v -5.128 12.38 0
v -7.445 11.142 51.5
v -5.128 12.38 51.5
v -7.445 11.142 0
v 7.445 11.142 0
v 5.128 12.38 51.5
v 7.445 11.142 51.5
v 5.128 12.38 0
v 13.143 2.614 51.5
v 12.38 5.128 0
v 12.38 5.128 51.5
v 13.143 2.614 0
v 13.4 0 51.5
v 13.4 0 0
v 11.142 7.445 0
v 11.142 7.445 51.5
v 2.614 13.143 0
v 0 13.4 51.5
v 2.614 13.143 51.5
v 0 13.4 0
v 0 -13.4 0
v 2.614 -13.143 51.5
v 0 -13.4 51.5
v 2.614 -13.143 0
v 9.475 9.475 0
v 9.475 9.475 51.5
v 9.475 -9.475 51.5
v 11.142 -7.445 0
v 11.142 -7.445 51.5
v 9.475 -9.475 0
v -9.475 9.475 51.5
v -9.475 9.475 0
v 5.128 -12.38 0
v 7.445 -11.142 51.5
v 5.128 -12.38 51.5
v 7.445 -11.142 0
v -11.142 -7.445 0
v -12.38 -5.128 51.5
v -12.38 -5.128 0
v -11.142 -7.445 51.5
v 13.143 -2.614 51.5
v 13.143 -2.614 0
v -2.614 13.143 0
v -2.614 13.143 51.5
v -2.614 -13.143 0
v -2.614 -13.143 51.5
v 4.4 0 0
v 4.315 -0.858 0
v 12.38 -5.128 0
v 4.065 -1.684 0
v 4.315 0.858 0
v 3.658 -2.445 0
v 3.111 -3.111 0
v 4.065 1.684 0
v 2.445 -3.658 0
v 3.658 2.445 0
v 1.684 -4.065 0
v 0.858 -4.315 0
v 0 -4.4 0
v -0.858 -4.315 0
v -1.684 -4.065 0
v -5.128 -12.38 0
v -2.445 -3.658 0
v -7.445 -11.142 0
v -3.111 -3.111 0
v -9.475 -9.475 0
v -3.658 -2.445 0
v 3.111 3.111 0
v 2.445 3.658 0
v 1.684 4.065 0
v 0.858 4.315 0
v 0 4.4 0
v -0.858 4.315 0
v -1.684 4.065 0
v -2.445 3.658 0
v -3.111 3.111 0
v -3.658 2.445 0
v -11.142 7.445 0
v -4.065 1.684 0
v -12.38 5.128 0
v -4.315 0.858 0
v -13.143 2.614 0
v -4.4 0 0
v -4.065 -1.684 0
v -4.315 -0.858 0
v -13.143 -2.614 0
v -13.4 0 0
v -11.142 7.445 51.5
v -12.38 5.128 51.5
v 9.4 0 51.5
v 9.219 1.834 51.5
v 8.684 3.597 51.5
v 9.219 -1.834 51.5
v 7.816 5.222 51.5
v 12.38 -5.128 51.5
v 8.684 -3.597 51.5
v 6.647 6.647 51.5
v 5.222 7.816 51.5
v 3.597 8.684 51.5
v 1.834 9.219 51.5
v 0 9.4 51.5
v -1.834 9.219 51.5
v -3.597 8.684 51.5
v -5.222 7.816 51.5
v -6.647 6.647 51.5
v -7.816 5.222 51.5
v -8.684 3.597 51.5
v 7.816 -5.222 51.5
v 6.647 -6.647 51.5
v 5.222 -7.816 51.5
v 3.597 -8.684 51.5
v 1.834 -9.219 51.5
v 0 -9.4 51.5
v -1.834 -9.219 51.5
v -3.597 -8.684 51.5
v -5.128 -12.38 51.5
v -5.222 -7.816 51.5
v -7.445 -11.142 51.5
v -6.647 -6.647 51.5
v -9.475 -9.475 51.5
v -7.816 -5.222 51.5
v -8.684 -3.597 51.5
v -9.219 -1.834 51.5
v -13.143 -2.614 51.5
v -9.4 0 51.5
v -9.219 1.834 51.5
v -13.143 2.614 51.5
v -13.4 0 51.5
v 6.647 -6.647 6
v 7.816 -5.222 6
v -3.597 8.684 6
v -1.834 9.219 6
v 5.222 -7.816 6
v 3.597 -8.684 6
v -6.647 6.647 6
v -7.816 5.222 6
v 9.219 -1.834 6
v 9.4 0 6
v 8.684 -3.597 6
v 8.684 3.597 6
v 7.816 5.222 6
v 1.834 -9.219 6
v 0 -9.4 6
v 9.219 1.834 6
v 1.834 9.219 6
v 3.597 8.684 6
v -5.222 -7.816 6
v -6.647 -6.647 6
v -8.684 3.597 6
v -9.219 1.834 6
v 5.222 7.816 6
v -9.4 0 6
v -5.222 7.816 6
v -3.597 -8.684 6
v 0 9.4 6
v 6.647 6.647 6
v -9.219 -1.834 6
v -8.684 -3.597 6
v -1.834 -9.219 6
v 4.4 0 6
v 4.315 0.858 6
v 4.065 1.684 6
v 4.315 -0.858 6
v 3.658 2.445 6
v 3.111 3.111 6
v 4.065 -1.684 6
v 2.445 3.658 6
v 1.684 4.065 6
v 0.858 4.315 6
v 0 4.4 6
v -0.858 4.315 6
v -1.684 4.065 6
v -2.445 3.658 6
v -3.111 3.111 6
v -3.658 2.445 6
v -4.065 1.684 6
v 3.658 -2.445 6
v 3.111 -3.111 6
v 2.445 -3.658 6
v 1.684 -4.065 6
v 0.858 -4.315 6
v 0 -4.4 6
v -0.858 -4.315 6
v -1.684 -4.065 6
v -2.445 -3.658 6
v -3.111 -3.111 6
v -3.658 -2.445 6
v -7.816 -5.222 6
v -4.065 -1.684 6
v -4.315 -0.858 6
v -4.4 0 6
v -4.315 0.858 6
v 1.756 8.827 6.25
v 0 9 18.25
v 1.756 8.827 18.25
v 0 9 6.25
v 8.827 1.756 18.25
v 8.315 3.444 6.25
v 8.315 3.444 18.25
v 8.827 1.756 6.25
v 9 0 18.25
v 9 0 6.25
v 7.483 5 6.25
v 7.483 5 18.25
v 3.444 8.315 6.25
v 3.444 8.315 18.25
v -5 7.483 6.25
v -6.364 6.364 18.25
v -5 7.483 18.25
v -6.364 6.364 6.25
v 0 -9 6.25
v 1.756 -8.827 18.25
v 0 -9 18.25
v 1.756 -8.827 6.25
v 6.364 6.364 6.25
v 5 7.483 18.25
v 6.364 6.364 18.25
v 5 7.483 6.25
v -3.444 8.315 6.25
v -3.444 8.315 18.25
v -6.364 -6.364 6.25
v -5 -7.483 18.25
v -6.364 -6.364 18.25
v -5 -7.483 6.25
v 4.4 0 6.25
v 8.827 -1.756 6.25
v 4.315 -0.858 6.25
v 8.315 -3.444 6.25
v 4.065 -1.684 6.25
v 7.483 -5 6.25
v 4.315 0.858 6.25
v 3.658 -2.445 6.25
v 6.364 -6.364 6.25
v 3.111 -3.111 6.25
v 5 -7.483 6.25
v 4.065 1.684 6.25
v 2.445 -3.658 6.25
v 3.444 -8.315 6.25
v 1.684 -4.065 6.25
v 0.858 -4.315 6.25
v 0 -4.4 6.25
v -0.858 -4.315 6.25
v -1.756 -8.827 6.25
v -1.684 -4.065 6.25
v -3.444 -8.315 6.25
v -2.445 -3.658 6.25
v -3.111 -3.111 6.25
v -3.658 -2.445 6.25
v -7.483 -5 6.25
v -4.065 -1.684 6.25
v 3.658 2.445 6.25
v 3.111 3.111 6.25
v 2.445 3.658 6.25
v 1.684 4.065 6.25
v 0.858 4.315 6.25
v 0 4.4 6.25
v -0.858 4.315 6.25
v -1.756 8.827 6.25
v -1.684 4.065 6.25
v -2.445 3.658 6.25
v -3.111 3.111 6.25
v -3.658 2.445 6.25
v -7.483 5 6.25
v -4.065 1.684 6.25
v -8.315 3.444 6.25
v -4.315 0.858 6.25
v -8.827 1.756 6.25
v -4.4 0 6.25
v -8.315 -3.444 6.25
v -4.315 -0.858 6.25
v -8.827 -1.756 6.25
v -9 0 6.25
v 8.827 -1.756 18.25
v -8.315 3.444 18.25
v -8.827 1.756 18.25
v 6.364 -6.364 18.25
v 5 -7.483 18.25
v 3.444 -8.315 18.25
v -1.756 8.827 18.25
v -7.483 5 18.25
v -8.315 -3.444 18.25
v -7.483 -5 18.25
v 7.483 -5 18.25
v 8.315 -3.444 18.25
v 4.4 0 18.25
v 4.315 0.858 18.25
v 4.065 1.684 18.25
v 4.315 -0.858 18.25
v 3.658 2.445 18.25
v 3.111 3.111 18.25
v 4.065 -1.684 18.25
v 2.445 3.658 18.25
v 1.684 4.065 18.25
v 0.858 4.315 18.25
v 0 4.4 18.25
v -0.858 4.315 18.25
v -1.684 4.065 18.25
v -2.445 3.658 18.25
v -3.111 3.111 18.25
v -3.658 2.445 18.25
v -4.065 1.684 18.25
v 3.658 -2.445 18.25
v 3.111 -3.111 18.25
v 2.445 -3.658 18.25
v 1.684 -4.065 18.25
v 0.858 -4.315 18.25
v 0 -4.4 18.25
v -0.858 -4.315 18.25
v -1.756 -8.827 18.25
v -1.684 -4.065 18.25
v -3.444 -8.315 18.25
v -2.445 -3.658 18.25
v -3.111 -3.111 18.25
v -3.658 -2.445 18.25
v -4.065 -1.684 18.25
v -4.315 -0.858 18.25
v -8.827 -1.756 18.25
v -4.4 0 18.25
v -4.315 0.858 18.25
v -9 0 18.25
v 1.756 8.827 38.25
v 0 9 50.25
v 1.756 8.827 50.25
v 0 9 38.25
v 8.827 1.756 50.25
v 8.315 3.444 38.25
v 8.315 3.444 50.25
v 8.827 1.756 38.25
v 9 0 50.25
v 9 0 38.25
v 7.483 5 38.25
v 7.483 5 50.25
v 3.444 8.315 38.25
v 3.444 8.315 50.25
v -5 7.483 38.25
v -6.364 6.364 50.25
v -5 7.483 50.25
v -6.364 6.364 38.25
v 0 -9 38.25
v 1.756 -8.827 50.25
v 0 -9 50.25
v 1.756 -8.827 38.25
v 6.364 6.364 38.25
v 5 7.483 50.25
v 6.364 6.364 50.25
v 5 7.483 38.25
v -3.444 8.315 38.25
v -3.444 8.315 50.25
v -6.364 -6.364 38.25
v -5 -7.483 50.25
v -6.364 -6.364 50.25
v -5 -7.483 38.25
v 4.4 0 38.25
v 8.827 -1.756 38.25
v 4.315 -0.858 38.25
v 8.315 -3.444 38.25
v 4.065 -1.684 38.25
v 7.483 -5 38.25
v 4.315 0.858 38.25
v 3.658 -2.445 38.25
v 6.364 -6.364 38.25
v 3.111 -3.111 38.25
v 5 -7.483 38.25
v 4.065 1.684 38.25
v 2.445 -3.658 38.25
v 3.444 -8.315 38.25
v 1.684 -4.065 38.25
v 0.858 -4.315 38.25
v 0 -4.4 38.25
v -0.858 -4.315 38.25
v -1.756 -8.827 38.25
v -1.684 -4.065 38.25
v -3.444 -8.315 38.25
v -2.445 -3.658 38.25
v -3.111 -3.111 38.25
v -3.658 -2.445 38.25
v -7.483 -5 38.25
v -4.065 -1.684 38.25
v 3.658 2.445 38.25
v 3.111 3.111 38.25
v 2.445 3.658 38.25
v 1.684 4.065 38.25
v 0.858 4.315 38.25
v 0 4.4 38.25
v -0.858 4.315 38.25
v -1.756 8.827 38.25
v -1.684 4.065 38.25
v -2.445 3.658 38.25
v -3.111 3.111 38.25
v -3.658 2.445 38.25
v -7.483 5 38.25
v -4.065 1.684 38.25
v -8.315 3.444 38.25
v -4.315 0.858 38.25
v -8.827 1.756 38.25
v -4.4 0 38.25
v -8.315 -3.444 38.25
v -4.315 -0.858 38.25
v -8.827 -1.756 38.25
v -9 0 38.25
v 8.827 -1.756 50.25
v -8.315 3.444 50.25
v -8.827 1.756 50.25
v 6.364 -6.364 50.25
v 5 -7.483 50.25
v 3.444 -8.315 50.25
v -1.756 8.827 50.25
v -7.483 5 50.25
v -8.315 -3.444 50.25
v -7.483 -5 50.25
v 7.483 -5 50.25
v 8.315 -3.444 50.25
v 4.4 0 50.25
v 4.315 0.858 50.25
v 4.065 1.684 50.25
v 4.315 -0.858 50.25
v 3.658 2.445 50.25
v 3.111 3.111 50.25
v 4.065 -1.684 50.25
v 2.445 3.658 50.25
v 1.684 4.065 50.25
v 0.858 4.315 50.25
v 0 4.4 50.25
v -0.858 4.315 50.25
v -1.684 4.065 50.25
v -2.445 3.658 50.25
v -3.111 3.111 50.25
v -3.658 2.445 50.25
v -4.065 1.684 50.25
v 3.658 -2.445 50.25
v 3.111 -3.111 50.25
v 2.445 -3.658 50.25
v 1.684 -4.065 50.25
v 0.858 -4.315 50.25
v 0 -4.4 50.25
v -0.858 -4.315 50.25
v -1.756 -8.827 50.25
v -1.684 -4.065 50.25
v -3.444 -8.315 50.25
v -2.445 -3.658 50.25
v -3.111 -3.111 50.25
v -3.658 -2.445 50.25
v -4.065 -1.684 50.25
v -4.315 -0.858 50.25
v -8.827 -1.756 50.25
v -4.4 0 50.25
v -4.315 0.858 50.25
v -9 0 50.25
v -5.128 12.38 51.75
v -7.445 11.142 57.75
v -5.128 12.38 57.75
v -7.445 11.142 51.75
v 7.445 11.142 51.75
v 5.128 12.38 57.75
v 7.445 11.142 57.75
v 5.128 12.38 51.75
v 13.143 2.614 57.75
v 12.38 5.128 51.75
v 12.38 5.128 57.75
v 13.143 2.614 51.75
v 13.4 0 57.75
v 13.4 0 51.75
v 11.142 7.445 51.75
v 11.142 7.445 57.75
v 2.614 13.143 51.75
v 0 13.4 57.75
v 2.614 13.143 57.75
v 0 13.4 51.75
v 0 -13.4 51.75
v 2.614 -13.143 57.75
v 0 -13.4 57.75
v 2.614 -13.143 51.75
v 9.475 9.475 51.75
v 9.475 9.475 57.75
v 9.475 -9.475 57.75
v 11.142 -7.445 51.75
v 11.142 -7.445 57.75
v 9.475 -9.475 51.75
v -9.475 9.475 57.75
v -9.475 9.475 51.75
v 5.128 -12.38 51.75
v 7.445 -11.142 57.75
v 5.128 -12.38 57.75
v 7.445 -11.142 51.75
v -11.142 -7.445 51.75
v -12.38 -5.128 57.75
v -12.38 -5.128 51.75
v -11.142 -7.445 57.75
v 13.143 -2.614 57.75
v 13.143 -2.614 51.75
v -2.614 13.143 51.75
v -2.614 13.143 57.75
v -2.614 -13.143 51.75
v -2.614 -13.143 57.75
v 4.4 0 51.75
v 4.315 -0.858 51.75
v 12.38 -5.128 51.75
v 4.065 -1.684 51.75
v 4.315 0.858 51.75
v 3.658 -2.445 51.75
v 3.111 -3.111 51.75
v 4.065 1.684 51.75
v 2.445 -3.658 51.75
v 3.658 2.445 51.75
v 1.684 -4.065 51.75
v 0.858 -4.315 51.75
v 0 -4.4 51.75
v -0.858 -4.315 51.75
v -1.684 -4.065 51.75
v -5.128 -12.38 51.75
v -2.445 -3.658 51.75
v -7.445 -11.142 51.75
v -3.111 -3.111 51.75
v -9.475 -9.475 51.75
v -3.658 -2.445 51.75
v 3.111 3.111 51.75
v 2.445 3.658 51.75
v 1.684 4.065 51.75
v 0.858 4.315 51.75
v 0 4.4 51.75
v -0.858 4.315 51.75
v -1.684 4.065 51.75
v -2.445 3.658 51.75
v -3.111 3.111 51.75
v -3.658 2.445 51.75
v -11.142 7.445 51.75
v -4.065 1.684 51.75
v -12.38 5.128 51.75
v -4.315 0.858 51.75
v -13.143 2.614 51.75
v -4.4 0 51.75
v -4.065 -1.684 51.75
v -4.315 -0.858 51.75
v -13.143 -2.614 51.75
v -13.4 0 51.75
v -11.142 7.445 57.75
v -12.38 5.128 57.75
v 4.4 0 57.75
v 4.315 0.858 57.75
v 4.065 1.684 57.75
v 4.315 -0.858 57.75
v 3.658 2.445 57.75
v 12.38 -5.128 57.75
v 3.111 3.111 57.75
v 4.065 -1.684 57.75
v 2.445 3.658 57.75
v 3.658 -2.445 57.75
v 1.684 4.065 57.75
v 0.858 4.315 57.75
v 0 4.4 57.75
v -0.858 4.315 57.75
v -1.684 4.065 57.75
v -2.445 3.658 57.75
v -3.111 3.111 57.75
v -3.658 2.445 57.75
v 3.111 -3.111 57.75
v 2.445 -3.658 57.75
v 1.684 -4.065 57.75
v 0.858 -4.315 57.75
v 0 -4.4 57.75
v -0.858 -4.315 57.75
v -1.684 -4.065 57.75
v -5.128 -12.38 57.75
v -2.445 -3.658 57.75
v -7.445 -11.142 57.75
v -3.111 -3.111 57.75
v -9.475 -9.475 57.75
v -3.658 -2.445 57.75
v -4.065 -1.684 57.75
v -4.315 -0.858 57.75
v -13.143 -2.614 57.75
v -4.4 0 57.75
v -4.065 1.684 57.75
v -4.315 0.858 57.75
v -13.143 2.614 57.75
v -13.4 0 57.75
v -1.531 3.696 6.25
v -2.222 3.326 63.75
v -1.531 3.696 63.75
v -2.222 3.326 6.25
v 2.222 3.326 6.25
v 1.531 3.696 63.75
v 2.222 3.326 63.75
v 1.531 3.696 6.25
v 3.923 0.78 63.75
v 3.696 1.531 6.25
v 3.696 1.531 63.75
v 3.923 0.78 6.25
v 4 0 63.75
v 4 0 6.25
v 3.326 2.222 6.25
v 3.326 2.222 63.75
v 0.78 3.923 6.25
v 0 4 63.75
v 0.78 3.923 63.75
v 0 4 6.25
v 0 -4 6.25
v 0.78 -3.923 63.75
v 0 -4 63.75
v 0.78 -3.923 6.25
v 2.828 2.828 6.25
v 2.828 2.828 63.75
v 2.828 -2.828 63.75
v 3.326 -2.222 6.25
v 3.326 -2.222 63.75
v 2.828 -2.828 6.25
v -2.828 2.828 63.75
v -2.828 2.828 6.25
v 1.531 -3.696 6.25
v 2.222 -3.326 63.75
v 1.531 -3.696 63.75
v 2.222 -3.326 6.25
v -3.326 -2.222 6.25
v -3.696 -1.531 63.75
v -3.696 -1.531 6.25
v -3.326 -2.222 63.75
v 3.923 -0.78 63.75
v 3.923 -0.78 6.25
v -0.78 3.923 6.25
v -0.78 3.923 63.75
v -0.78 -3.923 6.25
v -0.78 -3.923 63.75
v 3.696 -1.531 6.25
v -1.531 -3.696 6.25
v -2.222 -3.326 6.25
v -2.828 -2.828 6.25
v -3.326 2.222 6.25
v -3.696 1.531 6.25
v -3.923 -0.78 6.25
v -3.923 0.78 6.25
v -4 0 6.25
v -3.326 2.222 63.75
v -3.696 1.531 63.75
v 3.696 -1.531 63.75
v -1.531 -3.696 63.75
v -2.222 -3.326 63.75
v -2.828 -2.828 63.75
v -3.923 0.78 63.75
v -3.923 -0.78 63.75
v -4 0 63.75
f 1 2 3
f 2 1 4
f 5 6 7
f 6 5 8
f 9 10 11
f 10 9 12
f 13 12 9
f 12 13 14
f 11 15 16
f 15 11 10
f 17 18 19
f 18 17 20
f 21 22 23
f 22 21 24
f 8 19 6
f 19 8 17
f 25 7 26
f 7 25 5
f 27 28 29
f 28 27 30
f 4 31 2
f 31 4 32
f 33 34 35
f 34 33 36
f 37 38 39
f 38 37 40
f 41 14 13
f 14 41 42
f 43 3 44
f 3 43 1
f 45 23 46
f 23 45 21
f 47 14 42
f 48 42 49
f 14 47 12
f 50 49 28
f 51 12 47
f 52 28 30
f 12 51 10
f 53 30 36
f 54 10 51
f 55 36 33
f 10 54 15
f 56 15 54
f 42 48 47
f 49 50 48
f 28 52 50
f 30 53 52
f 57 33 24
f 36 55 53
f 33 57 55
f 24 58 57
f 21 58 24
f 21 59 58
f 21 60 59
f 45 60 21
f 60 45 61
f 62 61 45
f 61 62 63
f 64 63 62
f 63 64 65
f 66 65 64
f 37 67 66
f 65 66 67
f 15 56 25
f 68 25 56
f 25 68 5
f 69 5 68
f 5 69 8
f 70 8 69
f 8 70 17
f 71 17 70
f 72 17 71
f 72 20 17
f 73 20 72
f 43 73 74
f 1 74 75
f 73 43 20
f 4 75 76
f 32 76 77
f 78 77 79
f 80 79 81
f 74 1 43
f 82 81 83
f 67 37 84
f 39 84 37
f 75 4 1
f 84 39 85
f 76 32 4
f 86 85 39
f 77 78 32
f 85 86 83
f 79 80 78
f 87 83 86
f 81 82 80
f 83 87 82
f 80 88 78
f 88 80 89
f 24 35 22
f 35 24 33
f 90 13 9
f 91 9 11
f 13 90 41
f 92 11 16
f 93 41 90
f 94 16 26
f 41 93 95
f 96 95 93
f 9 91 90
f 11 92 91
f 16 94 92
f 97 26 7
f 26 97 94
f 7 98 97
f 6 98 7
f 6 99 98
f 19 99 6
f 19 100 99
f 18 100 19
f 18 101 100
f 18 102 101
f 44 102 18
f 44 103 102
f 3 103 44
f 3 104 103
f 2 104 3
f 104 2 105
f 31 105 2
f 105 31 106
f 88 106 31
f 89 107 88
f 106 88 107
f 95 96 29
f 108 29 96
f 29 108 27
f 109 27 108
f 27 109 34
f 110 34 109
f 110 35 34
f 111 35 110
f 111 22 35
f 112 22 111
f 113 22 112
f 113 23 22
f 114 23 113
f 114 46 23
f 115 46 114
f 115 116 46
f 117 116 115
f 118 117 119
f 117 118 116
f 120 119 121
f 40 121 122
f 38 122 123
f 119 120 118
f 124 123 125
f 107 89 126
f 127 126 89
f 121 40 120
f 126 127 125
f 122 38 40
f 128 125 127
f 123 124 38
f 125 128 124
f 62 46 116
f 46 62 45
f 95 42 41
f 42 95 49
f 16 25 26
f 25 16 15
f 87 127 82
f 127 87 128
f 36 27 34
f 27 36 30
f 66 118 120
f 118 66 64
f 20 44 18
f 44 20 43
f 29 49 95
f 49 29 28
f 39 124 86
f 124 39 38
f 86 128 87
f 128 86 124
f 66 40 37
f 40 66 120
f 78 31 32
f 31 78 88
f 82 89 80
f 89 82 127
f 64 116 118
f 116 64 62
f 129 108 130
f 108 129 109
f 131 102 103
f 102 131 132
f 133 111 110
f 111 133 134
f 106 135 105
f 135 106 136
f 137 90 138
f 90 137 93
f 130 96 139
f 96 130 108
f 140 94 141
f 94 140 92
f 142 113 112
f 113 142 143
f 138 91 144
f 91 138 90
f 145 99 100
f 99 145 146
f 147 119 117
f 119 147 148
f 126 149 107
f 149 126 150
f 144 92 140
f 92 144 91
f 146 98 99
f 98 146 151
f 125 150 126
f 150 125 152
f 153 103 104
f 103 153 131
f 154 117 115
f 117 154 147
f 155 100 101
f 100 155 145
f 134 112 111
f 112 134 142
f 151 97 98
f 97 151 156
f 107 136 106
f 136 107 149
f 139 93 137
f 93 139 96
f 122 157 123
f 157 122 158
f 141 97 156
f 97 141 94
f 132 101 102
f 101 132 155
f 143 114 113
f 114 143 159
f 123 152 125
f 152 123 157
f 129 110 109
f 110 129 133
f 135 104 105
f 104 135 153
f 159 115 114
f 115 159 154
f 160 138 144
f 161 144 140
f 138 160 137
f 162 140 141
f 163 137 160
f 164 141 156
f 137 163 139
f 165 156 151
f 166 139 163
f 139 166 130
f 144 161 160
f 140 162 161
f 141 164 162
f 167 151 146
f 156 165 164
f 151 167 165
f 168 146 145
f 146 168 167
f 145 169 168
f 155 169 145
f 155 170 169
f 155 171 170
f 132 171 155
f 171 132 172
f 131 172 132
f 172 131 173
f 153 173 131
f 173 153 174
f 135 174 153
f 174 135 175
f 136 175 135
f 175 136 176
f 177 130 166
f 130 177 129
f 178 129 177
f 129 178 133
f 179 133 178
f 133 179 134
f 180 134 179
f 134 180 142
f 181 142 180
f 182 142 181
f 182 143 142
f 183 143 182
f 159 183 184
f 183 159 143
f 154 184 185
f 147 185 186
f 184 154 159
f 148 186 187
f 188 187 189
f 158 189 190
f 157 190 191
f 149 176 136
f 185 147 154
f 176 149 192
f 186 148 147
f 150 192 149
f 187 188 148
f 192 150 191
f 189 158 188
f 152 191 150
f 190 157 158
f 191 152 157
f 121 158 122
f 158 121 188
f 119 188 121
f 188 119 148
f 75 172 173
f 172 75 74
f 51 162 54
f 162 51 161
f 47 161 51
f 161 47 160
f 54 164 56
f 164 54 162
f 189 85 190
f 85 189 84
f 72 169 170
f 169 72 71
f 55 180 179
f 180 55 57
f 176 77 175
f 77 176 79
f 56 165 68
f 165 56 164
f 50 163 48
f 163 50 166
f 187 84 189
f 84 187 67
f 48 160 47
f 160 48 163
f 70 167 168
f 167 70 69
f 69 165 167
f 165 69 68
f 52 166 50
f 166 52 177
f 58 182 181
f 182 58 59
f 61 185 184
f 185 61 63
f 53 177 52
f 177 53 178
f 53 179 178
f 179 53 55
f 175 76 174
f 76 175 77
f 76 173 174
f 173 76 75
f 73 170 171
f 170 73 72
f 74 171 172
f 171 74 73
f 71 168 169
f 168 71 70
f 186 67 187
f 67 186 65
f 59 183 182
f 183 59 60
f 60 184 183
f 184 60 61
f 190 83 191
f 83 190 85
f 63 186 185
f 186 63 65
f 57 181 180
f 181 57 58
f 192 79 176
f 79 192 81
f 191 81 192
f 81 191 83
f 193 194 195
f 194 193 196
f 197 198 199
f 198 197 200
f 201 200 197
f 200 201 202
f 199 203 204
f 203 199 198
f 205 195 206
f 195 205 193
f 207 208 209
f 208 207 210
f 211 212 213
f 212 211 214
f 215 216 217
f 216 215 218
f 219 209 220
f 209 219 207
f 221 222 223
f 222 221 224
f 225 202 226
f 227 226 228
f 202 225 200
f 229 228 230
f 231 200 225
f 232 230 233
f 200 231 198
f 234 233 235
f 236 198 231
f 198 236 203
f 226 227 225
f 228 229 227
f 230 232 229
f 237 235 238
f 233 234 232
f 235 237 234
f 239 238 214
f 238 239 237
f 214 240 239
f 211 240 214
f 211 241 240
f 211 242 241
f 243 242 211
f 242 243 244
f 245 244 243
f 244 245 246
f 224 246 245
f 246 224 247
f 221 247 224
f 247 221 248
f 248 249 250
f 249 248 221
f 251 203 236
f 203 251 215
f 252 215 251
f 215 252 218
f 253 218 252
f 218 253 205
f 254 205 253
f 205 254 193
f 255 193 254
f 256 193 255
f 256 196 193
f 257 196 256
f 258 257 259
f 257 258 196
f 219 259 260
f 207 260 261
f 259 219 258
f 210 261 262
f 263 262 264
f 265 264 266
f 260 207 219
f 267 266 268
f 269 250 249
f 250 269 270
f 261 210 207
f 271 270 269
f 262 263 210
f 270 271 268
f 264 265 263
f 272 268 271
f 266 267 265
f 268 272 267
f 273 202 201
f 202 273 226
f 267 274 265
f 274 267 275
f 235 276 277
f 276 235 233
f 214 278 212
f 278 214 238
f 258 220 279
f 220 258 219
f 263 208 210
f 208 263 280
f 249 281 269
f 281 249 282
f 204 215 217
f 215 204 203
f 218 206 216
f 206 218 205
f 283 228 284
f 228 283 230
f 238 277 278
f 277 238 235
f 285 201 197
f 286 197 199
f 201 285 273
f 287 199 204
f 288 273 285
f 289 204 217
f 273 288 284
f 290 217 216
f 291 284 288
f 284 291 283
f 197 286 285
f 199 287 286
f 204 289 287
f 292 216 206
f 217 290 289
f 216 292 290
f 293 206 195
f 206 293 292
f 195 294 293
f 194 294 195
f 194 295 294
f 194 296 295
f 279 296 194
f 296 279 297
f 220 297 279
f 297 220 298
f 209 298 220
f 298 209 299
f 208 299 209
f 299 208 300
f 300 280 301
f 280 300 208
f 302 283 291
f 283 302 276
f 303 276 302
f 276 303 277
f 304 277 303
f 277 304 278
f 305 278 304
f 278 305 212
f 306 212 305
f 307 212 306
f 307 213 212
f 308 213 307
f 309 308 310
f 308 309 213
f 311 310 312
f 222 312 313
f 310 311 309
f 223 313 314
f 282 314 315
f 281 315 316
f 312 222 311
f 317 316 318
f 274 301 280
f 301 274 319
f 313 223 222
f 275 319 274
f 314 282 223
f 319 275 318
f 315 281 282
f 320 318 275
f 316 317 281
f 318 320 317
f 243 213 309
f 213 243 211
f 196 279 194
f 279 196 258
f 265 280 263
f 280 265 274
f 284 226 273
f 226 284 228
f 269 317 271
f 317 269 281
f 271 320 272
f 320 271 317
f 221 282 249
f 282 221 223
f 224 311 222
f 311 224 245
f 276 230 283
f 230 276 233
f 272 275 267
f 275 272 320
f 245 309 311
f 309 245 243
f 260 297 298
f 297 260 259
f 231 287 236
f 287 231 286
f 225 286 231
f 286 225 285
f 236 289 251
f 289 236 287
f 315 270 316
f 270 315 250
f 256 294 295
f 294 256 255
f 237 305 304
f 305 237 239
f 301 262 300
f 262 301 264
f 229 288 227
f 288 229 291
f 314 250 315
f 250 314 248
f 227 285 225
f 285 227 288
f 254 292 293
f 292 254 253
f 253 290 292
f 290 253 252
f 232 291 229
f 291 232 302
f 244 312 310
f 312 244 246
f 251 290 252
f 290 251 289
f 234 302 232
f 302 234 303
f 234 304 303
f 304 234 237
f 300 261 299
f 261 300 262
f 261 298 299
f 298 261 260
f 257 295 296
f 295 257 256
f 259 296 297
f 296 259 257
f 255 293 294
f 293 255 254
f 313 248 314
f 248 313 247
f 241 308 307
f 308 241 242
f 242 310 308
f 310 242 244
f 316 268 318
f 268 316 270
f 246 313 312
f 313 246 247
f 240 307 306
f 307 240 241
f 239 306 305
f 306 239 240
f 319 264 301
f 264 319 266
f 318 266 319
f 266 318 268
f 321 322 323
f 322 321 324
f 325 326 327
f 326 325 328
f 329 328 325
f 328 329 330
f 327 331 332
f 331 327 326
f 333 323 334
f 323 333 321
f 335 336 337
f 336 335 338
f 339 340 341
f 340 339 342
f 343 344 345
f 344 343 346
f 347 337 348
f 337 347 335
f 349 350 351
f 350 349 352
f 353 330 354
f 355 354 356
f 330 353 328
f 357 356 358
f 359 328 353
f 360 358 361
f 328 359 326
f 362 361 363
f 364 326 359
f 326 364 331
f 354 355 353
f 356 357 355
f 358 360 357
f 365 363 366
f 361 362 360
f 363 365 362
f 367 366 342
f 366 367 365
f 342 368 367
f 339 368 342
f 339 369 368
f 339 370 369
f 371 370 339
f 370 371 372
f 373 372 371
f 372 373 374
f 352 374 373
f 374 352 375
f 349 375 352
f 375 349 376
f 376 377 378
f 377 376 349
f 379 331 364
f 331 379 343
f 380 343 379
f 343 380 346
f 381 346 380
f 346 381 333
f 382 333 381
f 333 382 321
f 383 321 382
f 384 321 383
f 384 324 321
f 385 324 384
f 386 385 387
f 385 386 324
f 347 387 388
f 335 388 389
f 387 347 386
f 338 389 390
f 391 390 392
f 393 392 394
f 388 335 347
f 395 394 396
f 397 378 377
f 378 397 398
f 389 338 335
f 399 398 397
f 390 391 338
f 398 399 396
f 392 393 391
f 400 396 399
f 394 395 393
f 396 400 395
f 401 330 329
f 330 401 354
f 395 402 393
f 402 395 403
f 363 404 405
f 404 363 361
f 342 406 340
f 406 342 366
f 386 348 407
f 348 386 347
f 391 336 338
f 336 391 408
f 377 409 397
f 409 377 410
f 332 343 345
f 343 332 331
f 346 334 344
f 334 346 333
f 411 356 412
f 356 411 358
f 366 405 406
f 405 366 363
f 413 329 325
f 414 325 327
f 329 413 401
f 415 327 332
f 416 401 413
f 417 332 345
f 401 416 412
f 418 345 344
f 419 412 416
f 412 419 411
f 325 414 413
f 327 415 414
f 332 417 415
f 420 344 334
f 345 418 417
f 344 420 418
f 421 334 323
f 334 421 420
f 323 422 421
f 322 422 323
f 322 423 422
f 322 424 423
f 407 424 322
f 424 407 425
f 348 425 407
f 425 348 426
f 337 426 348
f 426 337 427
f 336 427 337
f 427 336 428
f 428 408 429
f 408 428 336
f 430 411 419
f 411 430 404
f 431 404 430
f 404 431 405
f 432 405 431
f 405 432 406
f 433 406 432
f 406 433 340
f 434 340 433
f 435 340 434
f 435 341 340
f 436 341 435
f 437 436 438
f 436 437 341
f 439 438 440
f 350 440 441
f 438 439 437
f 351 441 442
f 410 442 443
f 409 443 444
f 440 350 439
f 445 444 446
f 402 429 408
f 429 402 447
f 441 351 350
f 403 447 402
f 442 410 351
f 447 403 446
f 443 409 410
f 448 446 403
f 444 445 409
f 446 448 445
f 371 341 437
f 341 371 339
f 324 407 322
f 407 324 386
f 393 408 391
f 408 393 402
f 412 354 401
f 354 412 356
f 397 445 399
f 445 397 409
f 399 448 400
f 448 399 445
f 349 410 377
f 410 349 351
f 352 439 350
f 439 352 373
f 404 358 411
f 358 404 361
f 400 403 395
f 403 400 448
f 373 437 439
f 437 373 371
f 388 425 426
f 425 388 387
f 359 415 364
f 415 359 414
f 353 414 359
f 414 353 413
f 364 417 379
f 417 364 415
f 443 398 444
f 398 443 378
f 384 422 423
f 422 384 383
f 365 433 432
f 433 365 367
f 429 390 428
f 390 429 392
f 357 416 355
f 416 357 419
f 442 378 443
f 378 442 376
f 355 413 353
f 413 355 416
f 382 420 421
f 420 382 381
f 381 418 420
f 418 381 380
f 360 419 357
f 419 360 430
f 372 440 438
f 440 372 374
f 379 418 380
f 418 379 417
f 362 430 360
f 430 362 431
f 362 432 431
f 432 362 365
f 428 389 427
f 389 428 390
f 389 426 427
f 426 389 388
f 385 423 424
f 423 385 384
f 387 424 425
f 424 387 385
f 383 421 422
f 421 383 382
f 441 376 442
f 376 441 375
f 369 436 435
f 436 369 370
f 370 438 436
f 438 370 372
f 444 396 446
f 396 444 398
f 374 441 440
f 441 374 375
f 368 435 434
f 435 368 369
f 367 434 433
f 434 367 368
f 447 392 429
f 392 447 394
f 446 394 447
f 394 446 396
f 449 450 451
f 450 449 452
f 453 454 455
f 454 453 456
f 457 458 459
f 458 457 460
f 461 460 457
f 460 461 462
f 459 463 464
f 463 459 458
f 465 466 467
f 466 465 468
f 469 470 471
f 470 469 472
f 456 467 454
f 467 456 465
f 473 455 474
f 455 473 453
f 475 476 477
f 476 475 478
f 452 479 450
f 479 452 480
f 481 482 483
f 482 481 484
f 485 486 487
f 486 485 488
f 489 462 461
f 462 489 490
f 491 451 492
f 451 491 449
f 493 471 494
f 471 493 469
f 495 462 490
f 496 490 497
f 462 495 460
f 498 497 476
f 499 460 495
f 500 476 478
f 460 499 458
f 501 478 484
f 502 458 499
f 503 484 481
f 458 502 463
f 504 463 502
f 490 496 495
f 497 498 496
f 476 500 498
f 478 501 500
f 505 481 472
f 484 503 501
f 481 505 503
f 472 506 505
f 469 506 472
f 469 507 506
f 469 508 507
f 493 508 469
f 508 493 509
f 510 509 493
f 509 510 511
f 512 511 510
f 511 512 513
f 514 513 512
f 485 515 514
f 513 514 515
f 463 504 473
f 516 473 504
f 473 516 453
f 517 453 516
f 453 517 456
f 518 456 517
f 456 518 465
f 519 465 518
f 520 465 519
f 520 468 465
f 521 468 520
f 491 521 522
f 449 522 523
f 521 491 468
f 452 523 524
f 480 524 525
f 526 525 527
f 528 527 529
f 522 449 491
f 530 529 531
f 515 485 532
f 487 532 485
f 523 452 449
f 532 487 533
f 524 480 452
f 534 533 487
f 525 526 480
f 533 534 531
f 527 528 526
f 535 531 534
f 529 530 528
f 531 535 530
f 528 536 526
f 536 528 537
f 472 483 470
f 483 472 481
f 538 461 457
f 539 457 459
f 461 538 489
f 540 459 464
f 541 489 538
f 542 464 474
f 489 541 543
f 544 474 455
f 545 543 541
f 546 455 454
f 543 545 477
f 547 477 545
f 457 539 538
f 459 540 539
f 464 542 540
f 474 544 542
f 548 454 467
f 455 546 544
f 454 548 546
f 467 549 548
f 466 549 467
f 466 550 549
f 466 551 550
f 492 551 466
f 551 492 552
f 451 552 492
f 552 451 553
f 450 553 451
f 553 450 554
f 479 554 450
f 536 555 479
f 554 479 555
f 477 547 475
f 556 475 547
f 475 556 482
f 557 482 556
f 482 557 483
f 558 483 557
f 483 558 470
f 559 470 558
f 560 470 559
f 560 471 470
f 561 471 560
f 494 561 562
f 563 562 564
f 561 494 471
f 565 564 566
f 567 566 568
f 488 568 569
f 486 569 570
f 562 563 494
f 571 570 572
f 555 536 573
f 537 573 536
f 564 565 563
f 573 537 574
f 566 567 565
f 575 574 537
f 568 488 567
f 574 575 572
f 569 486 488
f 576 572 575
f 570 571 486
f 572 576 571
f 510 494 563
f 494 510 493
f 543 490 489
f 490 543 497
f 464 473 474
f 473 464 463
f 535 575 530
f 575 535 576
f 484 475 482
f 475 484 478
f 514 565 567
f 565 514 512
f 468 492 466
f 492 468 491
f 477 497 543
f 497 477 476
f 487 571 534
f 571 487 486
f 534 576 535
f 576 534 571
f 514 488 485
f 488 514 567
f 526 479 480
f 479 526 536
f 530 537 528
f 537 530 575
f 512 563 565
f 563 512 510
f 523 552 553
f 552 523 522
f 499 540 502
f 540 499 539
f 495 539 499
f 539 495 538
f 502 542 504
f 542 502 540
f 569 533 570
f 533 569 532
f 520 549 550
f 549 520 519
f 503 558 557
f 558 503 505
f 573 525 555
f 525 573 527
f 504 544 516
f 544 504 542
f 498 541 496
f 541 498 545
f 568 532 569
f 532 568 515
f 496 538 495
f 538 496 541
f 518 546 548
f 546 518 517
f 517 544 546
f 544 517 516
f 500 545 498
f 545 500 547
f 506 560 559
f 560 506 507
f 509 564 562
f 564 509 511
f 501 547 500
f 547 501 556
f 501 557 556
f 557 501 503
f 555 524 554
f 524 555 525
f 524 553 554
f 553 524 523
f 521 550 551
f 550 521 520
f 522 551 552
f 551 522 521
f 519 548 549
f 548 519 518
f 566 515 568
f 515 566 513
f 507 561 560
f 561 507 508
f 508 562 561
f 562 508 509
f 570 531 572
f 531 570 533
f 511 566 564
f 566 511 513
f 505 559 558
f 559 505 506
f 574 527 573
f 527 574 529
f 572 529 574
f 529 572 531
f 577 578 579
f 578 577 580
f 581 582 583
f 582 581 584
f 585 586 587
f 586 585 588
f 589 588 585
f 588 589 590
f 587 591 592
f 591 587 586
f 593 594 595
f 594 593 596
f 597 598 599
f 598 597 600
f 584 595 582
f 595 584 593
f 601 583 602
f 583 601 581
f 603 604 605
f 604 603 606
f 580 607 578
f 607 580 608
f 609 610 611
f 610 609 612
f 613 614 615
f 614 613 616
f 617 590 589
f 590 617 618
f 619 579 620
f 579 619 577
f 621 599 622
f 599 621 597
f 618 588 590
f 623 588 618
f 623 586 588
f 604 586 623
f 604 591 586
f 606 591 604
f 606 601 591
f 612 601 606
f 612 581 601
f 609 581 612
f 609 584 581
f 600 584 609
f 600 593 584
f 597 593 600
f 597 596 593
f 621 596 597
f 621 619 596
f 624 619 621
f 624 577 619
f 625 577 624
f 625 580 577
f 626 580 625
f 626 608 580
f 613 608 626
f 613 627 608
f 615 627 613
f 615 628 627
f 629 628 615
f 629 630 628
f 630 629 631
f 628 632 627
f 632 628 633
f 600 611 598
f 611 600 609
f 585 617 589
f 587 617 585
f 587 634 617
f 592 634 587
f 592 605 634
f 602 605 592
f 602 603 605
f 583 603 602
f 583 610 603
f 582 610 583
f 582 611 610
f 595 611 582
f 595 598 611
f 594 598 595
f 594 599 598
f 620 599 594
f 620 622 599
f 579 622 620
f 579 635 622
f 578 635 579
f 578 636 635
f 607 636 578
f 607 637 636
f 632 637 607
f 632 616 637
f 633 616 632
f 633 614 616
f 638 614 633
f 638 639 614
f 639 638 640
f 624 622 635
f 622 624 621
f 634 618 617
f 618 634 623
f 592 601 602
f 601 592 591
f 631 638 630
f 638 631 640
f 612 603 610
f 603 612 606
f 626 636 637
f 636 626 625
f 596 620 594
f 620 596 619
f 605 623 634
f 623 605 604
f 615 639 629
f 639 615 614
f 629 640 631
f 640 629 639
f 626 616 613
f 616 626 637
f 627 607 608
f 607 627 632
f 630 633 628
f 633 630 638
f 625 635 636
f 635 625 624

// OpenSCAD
$fn = 32;

// ------------------------------------------------------------------------
// Shaft station: cup d26.8 x 51.5 mm, shaft d8
// Every part is its own module, assembly() places every instance.
// ------------------------------------------------------------------------

// --- part 1 ---
module housing_cup() {
  difference() {
    cylinder(h = 51.5, d = 26.8);
    translate([0, 0, 6]) cylinder(h = 46.5, d = 18.8);
    translate([0, 0, -1]) cylinder(h = 8, d = 8.8);
  }
}

// --- part 2 ---
module bearing_lower() {
  difference() {
      translate([0, 0, 0]) cylinder(h = 12, d = 18);
      translate([0, 0, -1]) cylinder(h = 14, d = 8.8);
    }
}

// --- part 3 ---
module bearing_upper() {
  difference() {
      translate([0, 0, 0]) cylinder(h = 12, d = 18);
      translate([0, 0, -1]) cylinder(h = 14, d = 8.8);
    }
}

// --- part 4 ---
module station_shaft() {
  translate([0, 0, -28.75]) cylinder(h = 57.5, d = 8);
}

// --- part 5 ---
module station_cover() {
  difference() {
    cylinder(h = 6, d = 26.8);
    translate([0, 0, -1]) cylinder(h = 8, d = 8.8);
  }
}

// --- assembly ---
module assembly() {
  color([0.80, 0.24, 0.20]) translate([0, 0, 0]) rotate([0, 0, 0]) housing_cup();
  color([0.20, 0.45, 0.75]) translate([0, 0, 6.25]) rotate([0, 0, 0]) bearing_lower();
  color([0.25, 0.62, 0.32]) translate([0, 0, 38.25]) rotate([0, 0, 0]) bearing_upper();
  color([0.92, 0.70, 0.18]) translate([0, 0, 35]) rotate([0, 0, 0]) station_shaft();
  color([0.58, 0.35, 0.70]) translate([0, 0, 51.75]) rotate([0, 0, 0]) station_cover();
}

assembly();
